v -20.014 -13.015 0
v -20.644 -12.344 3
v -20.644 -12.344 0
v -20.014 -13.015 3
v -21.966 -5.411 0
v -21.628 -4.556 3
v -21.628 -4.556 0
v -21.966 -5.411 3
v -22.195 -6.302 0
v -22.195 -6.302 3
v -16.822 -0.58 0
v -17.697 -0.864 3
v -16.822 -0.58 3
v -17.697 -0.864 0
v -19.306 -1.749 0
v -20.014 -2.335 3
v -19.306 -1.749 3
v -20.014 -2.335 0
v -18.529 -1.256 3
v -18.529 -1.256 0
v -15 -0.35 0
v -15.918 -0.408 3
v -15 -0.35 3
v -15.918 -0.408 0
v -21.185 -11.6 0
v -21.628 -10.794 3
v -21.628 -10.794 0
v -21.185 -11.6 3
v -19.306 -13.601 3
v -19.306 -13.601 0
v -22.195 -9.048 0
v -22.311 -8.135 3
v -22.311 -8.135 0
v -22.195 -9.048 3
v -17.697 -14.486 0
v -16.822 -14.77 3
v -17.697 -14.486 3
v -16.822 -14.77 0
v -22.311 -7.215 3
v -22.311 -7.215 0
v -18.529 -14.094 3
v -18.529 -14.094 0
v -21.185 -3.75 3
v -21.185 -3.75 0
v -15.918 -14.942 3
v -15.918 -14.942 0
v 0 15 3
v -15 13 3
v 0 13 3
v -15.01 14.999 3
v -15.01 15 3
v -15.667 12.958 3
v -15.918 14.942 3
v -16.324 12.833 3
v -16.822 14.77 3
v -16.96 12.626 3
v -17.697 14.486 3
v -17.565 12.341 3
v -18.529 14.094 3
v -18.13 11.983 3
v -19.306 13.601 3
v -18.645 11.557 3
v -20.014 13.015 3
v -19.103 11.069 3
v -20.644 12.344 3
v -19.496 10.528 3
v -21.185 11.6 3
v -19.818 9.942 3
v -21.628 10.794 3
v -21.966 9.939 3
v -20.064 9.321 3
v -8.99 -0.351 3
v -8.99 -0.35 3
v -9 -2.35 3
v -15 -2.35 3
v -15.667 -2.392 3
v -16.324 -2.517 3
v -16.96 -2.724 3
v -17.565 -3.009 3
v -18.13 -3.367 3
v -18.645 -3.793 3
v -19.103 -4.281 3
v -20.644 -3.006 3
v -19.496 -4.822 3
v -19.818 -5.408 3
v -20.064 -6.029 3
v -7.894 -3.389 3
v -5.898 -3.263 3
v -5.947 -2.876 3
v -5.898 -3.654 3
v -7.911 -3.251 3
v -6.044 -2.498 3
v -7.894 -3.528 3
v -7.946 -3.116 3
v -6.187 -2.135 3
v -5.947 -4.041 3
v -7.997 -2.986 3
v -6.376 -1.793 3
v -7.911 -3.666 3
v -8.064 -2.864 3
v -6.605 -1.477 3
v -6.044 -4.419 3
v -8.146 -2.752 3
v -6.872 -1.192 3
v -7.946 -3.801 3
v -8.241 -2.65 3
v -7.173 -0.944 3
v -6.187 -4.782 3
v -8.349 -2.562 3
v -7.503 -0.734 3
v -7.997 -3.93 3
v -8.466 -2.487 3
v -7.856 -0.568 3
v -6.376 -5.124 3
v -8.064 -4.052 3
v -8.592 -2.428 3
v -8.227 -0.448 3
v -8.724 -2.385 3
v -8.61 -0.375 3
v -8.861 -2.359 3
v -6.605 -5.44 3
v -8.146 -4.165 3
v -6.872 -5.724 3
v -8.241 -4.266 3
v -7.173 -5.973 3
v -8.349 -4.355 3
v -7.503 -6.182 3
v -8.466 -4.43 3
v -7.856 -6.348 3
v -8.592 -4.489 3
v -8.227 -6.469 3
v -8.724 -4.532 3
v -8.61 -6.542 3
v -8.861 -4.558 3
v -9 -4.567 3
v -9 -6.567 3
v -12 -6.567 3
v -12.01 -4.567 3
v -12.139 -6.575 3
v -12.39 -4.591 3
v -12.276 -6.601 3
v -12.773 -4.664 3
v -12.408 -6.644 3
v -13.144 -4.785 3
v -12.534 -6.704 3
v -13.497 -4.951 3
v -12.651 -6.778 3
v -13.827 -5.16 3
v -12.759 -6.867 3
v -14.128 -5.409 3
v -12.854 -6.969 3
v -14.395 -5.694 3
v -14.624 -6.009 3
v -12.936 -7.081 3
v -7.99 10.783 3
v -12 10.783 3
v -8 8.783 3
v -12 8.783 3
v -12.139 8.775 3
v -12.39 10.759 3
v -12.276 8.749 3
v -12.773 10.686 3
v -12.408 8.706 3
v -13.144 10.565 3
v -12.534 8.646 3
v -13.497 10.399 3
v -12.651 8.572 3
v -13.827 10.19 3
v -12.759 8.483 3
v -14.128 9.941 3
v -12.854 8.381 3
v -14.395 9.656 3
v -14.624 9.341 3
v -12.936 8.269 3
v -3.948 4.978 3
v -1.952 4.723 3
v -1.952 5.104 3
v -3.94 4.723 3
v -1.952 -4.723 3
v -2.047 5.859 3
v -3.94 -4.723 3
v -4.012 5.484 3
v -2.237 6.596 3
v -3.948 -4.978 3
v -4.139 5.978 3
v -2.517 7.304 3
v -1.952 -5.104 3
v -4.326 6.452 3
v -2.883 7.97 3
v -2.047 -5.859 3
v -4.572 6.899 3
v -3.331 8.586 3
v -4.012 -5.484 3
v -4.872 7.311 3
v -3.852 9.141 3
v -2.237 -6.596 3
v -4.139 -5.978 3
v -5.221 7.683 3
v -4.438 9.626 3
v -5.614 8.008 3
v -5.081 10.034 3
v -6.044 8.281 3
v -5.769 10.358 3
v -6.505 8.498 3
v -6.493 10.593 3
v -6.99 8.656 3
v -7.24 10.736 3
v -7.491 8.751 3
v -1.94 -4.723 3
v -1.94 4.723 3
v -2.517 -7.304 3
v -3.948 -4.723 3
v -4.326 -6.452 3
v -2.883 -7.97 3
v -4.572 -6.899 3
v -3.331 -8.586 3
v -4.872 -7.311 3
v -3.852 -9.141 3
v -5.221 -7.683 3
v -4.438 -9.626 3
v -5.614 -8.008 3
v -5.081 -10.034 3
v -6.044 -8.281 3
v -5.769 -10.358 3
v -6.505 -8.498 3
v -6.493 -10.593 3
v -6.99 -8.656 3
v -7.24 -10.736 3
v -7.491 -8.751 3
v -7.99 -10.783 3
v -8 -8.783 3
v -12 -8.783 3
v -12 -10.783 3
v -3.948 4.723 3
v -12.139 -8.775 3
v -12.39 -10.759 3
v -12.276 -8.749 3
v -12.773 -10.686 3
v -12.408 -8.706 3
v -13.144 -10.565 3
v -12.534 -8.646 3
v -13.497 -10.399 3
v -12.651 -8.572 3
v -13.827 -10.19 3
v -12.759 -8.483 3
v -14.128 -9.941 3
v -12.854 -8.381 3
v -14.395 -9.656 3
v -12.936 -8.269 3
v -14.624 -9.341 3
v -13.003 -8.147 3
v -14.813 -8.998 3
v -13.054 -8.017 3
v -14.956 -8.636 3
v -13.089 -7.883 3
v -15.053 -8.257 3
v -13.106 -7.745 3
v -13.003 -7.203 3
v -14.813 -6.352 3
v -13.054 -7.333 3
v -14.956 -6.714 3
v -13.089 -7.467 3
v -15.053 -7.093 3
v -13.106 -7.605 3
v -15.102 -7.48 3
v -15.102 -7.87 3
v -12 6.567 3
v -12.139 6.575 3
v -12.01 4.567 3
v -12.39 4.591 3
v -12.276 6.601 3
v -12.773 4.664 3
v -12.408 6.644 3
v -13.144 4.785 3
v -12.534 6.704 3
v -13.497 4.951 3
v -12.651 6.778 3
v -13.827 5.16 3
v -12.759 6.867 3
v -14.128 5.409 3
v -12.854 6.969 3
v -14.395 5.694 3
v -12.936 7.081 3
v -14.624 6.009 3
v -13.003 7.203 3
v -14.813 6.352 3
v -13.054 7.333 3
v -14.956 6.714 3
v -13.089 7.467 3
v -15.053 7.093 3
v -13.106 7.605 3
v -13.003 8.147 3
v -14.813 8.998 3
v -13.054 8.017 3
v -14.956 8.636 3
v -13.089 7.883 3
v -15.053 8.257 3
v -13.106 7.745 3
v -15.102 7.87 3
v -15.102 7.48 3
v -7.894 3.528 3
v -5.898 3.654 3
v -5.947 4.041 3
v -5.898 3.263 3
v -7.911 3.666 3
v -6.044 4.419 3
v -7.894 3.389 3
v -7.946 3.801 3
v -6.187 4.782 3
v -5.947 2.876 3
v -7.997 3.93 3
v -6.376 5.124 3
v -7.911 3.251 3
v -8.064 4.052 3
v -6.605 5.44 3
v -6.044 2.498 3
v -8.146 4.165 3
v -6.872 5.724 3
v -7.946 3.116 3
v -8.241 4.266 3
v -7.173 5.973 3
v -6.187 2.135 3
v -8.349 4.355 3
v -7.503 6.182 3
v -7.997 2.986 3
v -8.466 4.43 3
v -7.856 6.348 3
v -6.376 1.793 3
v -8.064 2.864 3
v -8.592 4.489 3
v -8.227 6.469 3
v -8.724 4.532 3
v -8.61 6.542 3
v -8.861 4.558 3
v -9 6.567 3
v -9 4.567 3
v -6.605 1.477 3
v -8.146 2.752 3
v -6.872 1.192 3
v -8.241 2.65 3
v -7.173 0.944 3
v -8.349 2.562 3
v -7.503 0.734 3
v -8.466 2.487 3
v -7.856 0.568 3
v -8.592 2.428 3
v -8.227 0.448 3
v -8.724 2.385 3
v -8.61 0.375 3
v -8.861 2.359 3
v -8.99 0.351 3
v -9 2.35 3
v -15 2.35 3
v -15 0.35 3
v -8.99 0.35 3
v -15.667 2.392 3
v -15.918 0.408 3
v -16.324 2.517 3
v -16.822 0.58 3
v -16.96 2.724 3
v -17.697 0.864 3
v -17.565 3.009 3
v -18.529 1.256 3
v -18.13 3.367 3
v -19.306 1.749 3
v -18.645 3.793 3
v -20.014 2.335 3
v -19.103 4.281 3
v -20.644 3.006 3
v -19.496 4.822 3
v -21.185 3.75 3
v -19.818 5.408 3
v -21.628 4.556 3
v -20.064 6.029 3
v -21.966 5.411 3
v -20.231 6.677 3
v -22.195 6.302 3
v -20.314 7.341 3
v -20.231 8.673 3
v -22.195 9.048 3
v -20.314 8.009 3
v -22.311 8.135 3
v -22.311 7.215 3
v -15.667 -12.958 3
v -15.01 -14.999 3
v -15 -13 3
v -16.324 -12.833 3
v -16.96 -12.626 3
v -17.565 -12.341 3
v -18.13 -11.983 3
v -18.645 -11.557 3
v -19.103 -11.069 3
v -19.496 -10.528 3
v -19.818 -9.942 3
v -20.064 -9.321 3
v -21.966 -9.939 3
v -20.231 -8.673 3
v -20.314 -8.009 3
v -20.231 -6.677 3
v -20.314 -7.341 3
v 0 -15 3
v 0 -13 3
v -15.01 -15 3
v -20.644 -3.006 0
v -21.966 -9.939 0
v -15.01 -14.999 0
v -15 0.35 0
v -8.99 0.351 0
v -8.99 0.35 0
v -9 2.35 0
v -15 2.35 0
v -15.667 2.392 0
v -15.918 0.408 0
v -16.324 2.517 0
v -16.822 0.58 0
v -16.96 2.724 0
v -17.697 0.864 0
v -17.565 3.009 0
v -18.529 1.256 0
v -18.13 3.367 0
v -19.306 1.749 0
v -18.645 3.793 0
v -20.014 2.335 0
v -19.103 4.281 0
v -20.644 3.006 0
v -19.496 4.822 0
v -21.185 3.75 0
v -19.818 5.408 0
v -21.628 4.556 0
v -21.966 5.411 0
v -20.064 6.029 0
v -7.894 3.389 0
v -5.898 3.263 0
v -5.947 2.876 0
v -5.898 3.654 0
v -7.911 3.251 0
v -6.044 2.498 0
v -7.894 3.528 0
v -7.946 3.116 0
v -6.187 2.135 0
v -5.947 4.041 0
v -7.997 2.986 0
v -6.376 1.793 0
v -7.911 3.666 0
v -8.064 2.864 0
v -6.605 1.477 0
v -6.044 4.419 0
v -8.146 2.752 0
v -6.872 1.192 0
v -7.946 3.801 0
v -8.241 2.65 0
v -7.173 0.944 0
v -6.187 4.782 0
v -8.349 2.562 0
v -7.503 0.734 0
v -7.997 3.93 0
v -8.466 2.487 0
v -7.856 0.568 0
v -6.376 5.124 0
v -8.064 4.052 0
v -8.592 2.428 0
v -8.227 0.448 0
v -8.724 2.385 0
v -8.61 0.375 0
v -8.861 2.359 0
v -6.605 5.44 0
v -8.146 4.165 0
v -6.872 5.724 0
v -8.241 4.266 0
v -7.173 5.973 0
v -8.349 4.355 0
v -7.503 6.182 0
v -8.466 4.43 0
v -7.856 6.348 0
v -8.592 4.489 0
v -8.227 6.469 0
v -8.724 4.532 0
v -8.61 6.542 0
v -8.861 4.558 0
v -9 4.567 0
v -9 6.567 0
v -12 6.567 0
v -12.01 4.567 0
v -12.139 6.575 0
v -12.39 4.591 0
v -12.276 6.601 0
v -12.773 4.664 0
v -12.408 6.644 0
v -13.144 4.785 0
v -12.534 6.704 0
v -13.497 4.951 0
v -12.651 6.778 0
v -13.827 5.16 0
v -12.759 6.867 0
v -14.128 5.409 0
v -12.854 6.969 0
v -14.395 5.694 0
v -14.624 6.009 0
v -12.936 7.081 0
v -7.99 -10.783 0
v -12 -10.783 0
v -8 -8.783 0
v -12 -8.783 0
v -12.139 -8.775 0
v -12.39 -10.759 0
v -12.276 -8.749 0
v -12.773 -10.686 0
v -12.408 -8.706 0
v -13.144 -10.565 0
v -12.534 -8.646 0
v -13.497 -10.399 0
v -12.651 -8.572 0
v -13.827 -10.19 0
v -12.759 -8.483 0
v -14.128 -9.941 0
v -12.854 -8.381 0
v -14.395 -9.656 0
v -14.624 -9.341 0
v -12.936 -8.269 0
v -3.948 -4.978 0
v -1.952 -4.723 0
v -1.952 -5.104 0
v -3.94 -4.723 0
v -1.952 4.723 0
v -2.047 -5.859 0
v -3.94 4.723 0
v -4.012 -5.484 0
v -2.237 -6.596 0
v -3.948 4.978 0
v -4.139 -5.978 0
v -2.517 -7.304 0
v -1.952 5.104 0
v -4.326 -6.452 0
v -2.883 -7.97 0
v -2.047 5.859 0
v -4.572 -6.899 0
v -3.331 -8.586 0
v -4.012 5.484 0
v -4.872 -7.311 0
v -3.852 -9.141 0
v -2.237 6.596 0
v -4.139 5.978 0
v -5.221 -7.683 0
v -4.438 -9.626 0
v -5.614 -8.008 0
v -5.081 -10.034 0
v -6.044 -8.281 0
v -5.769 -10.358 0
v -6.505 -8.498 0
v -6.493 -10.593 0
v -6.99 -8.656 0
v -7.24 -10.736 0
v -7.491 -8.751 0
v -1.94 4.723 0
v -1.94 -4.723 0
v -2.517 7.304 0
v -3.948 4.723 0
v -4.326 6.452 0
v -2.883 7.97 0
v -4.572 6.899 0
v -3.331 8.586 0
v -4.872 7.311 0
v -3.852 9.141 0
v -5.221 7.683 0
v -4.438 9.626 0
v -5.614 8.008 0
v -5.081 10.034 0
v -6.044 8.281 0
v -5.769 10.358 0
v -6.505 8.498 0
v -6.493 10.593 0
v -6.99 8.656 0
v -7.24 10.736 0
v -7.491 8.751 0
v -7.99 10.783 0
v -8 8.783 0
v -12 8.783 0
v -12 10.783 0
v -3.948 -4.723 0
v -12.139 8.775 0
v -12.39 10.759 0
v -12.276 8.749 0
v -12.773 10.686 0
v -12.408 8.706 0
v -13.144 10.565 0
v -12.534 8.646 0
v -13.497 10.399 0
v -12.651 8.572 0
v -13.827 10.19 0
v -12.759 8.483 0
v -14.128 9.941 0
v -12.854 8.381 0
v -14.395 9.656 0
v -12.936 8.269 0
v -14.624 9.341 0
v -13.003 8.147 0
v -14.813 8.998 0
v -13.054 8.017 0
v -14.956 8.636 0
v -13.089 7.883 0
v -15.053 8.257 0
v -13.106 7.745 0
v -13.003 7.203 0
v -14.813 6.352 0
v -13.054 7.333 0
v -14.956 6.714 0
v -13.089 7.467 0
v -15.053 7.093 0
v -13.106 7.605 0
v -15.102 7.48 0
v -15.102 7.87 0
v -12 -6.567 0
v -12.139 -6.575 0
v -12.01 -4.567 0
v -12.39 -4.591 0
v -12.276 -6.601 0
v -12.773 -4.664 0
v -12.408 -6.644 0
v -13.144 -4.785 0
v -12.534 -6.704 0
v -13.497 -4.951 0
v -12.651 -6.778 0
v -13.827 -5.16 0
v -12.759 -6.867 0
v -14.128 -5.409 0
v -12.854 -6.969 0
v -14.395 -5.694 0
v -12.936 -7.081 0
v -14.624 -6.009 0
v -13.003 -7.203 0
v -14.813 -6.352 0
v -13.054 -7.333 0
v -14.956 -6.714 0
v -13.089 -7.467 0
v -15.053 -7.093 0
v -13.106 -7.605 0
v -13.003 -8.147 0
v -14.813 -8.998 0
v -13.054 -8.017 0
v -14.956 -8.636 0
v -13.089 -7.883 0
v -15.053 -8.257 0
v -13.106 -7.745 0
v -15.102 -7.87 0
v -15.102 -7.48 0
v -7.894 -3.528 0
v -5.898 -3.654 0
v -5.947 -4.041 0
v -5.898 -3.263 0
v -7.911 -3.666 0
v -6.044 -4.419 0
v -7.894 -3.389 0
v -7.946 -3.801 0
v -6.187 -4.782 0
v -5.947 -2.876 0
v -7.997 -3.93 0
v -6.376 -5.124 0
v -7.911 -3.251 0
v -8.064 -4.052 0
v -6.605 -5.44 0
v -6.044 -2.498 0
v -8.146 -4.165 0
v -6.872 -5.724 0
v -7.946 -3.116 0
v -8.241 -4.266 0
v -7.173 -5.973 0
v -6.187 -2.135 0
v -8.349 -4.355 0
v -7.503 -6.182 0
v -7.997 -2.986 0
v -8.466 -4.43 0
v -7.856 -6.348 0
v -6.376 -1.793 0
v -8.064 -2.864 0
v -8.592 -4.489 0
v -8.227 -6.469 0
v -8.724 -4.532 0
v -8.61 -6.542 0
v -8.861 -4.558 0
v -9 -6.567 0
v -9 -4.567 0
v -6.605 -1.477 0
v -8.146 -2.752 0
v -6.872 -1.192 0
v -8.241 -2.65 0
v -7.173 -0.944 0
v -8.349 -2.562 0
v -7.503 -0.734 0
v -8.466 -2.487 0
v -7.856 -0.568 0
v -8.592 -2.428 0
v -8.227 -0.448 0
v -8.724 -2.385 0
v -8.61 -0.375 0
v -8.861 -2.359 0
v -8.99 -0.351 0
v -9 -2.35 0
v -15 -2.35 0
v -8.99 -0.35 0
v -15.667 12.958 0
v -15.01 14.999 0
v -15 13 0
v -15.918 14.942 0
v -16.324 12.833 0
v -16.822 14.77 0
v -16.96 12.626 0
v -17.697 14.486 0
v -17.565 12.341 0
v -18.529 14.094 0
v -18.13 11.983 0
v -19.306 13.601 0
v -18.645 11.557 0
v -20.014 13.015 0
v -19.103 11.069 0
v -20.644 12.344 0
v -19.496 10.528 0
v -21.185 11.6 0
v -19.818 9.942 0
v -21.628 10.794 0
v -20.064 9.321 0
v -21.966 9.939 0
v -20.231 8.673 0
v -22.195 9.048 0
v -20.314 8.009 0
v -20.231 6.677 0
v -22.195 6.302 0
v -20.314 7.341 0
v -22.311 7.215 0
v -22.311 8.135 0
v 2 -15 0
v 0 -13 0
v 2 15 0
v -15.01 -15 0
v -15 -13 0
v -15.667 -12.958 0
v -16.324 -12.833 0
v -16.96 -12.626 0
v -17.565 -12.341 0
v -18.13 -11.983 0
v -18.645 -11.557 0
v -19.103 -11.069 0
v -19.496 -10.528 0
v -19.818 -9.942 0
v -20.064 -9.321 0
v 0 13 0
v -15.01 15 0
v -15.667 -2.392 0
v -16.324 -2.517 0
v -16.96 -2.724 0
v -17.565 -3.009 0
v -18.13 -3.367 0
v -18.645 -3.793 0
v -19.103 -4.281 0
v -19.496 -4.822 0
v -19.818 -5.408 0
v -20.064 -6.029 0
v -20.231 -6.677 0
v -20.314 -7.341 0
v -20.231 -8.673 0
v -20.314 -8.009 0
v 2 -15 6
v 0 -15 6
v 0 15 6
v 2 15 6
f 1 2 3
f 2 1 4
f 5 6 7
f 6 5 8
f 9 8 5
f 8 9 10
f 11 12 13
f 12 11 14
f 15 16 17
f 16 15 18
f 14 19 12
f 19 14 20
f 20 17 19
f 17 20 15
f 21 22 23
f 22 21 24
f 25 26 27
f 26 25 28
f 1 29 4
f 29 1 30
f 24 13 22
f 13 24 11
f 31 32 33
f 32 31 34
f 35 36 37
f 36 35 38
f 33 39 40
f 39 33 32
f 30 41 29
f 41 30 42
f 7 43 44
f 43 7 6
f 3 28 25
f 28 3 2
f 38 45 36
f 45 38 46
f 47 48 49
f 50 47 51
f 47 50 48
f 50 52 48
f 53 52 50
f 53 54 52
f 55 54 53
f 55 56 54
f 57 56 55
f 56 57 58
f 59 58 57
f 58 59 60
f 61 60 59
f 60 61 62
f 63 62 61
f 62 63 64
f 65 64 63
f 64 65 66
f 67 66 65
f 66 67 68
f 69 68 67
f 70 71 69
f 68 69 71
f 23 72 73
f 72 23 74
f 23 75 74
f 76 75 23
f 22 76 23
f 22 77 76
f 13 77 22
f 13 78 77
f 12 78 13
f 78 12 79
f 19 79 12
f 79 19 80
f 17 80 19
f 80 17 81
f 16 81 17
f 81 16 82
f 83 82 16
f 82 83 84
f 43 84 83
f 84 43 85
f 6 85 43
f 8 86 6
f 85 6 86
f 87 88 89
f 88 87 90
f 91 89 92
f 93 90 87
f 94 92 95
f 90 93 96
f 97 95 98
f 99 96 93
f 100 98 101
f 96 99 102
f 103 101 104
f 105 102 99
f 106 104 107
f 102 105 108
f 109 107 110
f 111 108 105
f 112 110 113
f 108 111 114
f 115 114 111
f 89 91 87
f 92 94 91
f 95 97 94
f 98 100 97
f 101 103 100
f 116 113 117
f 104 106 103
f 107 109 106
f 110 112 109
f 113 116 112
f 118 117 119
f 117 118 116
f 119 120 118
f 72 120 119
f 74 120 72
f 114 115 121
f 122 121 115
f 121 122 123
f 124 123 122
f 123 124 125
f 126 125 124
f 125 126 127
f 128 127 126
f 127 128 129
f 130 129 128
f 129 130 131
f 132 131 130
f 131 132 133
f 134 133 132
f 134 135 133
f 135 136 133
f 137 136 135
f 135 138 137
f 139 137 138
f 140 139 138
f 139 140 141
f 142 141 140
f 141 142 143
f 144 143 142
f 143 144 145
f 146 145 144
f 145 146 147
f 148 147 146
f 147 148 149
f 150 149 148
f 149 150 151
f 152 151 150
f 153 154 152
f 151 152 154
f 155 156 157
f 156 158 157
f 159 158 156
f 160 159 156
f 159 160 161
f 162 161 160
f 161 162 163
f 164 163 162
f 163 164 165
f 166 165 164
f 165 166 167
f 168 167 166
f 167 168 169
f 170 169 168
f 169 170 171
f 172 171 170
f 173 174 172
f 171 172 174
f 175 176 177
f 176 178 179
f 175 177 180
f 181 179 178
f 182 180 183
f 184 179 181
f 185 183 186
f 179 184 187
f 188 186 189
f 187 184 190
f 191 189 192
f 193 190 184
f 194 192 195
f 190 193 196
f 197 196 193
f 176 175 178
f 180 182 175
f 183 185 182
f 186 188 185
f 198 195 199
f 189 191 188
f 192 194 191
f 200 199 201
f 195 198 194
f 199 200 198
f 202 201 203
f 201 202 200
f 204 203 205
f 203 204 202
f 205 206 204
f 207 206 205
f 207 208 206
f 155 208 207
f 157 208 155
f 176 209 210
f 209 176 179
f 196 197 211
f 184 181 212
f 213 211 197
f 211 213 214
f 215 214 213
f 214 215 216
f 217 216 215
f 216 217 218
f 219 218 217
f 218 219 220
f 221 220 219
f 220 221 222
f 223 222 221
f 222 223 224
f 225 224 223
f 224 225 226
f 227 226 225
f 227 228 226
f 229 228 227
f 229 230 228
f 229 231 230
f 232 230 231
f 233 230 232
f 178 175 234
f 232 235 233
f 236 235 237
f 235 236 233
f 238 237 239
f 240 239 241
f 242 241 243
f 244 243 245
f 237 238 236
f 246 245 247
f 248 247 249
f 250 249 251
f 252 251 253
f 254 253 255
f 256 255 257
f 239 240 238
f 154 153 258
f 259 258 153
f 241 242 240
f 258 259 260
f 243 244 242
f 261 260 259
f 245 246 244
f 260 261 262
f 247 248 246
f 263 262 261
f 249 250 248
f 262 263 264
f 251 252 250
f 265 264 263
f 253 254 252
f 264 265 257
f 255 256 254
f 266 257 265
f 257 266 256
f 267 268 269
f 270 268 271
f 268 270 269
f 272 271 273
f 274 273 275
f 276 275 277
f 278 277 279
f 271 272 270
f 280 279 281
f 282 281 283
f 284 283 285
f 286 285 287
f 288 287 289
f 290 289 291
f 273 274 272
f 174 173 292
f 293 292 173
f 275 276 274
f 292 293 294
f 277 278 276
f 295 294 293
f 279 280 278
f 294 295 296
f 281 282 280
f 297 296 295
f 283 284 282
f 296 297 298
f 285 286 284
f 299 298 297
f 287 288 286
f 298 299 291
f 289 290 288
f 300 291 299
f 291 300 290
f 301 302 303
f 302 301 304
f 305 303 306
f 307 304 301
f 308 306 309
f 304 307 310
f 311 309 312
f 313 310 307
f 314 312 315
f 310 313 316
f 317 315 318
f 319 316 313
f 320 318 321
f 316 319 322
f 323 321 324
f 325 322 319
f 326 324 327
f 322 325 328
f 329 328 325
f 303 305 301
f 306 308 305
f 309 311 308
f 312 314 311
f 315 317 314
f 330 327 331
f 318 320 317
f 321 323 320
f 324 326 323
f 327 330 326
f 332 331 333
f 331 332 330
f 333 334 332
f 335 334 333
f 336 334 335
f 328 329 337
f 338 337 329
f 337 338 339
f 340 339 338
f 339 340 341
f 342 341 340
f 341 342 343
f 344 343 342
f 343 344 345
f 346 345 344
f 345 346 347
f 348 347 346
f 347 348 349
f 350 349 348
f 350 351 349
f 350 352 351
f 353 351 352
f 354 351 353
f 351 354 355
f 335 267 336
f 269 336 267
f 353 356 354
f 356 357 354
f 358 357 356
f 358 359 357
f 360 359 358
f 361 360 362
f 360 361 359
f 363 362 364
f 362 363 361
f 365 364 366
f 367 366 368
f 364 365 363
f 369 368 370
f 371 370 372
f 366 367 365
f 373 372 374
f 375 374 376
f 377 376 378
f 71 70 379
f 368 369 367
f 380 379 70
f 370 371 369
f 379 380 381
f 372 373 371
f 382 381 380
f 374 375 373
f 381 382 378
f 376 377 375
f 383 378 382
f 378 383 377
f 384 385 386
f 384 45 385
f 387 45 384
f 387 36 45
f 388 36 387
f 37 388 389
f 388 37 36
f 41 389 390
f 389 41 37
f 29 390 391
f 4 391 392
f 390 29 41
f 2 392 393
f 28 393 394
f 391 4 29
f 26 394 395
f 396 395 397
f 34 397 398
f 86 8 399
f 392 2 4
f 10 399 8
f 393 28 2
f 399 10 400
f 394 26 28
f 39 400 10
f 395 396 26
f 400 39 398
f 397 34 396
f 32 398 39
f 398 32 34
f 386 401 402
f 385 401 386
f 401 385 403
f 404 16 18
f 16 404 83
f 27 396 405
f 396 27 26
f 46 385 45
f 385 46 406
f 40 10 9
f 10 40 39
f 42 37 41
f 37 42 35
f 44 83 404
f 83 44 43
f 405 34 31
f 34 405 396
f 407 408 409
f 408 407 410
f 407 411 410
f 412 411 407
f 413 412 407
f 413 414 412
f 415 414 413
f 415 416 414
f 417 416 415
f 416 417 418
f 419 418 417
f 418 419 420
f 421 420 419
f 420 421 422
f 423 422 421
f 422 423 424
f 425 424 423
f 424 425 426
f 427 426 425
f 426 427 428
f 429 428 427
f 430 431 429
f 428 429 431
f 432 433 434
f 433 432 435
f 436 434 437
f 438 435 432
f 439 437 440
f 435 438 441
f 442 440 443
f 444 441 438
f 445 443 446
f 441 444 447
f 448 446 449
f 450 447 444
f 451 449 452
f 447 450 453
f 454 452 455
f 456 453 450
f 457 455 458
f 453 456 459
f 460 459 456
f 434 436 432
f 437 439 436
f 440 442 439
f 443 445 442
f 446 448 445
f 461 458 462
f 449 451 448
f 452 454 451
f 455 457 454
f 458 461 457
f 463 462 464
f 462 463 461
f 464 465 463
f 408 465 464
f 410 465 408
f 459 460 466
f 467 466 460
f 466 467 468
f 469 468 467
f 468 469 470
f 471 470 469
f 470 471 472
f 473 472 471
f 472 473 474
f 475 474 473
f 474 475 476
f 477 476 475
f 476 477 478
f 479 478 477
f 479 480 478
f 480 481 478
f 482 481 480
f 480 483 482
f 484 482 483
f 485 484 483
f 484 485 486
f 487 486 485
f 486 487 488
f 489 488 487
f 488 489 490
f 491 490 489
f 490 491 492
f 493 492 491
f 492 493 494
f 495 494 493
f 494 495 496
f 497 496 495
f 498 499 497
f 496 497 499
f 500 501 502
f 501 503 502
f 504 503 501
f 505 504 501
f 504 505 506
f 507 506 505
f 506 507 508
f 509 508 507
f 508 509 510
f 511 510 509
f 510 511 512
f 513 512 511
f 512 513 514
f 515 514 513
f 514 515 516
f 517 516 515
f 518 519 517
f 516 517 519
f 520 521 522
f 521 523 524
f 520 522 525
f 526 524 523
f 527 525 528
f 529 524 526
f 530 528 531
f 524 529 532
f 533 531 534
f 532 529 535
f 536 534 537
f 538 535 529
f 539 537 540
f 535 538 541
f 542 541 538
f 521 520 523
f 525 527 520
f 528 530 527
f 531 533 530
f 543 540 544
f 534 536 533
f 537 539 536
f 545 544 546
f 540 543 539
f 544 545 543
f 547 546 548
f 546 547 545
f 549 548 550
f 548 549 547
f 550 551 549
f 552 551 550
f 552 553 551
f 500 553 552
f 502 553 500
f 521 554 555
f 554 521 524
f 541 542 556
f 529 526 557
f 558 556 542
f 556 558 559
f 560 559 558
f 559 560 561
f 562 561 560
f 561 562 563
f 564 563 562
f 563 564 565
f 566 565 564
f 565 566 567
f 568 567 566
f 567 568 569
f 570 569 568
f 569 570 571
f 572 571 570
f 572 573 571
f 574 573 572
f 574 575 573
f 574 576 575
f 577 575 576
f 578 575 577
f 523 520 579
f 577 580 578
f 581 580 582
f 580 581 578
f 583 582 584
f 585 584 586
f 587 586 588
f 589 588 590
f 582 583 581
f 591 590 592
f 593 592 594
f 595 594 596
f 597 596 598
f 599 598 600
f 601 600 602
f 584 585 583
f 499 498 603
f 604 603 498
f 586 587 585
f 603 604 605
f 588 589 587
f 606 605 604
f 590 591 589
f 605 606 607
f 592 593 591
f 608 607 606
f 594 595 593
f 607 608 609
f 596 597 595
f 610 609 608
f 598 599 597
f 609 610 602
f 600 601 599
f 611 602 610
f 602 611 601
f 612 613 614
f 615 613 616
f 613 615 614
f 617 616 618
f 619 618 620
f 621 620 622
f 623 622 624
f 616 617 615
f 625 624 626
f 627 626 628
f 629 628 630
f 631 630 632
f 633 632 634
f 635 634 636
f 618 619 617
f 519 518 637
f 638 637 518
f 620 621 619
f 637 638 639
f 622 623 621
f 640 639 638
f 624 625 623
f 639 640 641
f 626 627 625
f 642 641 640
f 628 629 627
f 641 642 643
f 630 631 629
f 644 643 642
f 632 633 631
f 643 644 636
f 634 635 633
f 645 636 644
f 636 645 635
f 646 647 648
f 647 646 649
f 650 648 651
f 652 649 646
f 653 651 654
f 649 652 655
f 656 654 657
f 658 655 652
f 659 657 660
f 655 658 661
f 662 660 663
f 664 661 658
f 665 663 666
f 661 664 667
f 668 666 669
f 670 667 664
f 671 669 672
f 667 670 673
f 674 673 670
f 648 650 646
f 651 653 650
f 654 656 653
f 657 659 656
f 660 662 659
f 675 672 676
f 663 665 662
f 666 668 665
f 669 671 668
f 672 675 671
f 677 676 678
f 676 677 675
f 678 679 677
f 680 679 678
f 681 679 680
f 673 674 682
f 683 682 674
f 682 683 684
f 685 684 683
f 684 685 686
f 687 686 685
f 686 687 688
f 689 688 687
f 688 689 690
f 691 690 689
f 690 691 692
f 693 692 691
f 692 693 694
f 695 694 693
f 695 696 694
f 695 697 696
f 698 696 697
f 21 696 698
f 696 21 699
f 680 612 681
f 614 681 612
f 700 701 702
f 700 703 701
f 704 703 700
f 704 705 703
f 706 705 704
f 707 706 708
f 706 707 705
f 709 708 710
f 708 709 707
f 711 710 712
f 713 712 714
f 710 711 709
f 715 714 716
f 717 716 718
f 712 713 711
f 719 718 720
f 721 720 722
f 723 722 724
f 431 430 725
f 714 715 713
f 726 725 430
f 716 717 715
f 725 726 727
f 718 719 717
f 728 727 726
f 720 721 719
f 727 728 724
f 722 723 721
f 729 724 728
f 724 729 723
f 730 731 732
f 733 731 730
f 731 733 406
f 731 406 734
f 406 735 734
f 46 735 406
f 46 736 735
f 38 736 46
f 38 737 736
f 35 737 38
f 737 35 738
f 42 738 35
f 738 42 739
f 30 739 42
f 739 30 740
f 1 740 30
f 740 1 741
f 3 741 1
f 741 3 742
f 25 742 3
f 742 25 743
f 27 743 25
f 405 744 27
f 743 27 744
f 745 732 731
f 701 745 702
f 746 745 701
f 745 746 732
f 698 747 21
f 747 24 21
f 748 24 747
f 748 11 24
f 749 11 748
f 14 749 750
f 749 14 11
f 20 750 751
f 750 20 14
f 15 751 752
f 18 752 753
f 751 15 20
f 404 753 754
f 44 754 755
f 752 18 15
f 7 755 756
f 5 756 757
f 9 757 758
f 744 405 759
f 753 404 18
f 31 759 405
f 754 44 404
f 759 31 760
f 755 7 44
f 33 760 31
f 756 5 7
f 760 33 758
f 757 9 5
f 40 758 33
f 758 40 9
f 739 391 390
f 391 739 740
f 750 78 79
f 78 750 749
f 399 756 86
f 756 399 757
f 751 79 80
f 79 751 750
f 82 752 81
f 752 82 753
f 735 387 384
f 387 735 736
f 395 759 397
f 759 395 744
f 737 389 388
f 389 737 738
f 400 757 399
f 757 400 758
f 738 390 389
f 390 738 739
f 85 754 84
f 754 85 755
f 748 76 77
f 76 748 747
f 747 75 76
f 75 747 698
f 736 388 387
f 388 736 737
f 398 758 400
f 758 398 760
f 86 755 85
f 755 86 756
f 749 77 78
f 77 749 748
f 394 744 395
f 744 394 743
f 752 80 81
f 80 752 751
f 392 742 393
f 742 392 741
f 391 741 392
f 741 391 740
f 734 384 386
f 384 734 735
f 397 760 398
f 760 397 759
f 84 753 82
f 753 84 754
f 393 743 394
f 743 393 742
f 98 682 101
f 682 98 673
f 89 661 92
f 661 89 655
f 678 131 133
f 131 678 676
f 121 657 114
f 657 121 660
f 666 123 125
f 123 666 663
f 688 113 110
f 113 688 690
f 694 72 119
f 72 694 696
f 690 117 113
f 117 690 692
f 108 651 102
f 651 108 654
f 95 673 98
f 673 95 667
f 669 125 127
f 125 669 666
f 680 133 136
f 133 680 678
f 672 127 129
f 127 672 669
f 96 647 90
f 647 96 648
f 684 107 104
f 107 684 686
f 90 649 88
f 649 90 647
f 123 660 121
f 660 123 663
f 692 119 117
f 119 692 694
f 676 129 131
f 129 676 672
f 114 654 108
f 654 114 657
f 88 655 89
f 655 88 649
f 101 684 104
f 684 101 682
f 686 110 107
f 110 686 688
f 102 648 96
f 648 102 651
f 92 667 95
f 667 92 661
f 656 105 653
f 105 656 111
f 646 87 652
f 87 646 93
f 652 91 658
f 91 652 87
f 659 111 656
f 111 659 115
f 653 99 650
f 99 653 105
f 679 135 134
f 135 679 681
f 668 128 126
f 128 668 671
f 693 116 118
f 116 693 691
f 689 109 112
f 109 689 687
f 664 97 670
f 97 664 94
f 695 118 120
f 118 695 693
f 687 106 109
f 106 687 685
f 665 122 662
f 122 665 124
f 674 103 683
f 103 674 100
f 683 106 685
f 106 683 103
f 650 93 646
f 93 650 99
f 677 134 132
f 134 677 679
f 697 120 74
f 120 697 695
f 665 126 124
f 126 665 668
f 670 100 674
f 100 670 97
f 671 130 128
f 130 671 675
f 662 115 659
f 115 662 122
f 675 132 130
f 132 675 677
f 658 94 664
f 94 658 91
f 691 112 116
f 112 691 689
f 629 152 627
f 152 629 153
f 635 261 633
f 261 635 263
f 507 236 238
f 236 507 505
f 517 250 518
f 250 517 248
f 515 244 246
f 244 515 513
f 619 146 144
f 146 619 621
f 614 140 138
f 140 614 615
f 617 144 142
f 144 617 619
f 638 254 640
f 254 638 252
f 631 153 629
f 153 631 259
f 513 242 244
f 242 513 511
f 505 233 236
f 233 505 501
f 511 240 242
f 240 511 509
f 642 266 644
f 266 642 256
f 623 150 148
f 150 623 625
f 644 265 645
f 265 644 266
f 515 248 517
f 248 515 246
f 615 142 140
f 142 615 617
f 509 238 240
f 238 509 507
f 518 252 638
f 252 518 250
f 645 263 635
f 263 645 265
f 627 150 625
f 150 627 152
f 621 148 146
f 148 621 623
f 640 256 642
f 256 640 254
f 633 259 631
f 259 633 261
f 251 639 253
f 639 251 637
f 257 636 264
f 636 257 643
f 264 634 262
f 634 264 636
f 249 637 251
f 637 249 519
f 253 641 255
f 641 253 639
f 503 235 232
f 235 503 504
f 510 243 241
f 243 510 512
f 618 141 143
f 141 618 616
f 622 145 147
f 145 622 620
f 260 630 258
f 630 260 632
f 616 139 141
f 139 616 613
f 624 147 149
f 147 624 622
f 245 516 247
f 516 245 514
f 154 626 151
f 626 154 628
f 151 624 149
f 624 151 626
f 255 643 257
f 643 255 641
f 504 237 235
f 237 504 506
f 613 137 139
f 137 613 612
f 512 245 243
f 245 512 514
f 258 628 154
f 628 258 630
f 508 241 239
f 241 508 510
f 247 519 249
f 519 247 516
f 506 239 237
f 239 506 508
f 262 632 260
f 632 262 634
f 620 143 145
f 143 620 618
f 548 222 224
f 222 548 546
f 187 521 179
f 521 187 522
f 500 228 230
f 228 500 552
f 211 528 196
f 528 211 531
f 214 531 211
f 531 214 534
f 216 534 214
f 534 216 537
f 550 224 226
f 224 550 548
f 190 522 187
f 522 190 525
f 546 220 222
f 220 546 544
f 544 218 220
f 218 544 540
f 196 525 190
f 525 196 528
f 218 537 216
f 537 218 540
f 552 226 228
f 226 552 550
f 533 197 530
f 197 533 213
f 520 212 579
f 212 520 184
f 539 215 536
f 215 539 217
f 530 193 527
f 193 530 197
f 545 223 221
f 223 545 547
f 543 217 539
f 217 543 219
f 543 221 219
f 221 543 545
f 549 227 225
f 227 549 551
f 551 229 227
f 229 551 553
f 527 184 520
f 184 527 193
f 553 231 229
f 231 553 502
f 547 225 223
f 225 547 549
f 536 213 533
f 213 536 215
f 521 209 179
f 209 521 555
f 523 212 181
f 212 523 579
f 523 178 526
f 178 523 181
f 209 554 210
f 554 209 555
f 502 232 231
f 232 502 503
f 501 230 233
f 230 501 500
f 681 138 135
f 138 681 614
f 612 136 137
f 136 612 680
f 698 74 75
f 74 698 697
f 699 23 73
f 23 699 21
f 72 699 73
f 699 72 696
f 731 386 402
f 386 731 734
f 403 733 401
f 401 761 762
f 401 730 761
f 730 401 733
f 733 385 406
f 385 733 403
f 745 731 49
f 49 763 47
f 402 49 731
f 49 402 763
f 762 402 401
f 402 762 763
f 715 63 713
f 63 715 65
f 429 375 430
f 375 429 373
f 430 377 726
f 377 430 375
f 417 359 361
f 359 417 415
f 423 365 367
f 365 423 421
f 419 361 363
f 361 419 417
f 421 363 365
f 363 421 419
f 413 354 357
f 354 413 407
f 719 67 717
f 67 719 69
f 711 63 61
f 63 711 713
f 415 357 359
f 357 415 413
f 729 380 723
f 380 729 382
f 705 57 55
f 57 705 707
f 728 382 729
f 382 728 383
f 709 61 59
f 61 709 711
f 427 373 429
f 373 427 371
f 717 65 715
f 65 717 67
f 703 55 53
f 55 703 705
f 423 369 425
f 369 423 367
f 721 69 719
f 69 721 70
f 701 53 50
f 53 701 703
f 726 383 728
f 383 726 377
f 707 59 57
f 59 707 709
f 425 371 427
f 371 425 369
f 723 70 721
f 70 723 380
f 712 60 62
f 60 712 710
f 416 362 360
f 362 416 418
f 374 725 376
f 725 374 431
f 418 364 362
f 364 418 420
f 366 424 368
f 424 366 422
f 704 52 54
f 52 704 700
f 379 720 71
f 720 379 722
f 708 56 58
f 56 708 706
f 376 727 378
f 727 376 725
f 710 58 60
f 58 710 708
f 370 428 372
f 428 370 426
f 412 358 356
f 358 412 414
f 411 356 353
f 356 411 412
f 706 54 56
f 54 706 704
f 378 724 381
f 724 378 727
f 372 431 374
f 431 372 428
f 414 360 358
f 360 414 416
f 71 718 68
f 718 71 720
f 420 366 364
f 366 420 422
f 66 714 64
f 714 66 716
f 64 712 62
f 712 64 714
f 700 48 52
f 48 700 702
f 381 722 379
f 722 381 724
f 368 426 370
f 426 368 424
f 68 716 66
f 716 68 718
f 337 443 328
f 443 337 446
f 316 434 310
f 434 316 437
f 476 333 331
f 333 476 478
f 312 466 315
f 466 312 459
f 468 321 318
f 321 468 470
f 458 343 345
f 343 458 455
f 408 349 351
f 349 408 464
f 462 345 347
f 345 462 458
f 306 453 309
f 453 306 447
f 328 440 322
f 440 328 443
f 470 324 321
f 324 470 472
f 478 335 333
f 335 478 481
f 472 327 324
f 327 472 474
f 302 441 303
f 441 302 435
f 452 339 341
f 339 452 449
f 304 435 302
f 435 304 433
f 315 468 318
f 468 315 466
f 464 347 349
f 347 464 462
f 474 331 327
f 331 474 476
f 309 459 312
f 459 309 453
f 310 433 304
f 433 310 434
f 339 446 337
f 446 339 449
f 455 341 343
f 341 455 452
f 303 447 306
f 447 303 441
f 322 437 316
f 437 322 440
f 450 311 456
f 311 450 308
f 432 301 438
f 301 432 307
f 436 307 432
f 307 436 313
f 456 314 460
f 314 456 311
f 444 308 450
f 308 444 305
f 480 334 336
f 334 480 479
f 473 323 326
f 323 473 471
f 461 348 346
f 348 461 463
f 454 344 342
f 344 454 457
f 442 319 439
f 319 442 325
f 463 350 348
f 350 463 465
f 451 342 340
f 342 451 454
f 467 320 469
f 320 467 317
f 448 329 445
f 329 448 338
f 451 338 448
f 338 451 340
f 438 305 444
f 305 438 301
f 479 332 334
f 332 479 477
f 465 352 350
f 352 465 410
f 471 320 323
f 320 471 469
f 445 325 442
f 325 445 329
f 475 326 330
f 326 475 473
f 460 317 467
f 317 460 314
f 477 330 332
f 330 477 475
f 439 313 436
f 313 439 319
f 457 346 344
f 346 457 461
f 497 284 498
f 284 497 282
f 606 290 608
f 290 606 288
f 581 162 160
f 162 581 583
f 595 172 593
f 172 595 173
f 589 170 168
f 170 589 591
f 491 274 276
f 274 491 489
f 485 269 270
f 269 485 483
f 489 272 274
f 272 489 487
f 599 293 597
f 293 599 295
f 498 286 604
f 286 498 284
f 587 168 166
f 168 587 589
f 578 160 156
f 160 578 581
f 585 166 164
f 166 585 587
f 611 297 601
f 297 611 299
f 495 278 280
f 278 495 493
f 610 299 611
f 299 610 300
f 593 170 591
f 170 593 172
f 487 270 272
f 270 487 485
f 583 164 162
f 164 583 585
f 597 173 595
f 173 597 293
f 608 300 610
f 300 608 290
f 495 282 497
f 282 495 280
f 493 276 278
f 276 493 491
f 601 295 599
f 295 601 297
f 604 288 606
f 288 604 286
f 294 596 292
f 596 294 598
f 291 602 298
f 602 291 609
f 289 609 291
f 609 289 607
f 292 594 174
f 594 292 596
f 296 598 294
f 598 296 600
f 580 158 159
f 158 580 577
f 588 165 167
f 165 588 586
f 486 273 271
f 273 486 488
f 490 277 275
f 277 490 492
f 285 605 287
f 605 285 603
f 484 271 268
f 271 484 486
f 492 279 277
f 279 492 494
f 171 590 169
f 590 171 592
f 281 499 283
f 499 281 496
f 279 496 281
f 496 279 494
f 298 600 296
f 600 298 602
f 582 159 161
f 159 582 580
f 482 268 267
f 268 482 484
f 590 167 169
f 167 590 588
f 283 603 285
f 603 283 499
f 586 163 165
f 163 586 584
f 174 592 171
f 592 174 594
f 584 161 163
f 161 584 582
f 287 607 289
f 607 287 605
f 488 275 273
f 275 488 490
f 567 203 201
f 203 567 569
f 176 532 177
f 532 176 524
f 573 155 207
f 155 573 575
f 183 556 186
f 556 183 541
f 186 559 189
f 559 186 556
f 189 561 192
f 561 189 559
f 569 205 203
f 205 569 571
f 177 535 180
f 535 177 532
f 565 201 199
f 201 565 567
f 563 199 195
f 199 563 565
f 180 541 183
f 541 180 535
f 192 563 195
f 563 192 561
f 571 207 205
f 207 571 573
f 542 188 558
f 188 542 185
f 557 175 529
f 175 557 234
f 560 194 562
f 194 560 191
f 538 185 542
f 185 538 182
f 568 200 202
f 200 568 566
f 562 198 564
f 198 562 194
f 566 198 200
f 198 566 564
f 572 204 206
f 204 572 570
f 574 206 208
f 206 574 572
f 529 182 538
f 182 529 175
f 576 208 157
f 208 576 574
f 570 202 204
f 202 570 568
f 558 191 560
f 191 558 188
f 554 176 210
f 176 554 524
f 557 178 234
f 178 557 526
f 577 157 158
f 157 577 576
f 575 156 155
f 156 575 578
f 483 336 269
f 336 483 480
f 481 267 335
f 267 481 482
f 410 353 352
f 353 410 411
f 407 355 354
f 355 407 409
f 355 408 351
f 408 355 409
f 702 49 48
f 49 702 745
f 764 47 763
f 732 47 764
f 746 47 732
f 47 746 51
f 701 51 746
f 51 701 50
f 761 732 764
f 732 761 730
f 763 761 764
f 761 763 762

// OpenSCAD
// draw an arc width height h between radius r1..r2 and angles a1..a2
module arc(r1, r2, h, a1=0, a2=0) {
  if(a2-a1<=180) {
    difference() {
      cylinder(r=r2,h=h);
      translate([0,0,-1]) {
        cylinder(r=r1,h=h+2);
      }
      rotate(a2) {
        translate([-r1-r2,0,-1]) {
          cube([2*(r1+r2),2*(r1+r2),h+2]);
        }
      }
      rotate(a1+180) {
        translate([-r1-r2,0,-1]) {
          cube([2*(r1+r2),2*(r1+r2),h+2]);
        }
      }
    }
  } else {
    difference() {
      cylinder(r=r2,h=h);
      translate([0,0,-1]) {
        cylinder(r=r1,h=h+2);
      }
      intersection() {
	      rotate(a2) {
          translate([-r1-r2,0,-1]) {
            cube([2*(r1+r2),2*(r1+r2),h+2]);
          }
        }
	      rotate(a1+180) {
          translate([-r1-r2,0,-1]) {
            cube([2*(r1+r2),2*(r1+r2),h+2]);
          }
        }
	    }
    }
  }
}

                           
// sline - generate a "snake line" of width w and height h 
// with a arbitrary sequence of segments defined by a radius and a turning angle
//
//   angle[i] > 0  left turn / counter-clockwise
//   angle[i] < 0  left turn / clockwise
//   angle[i] = 0  straight segment with length radius[i]
//
                           
// Heinz Spiess, 2014-09-06 (CC BY-SA)
                           
module sline(angle,radius,i,w,h){
  r = abs(radius[i]);
  a = angle[i];
  scale([angle[i]>=0?1:-1,1,1])
  translate([a?r:0,0,0]) {
    translate([-w/2,-r-0.01,0]) cube([w,0.02,h]); // tiny overlap!
    if(a) {
      arc(r-w/2,r+w/2,0,a,h=h);
    } else if(r>0) {
      translate([-w/2,-r,0]) {
        cube([w,r,h]);
      }
    }
    if(i+1<len(angle)) {
      rotate(angle[i]) {
	      translate([a?-r:0,a?0:-r,0]) {
	       sline(angle,radius,i+1,w,h);
        }
      }
    }
  }
}

$fn = 50;

module plastic_spring(
  h = 20, // height
  d=18, // ?
  w = 6,  // case wall thickness
  ws = 2, // spring wall thickness
  el = 6, // ?
  l = 14, // len
  ){


  r = l + 2*ws;
  D = d + 2 * w - 2 * ws - 0.7;
      
  // plastic spring
  for(sy=[-1,1]) {
    scale([1,sy,1]) {
      translate([0,d/2+w-ws/2,0]) {
        rotate(-90) {
          sline([0,180,0,180,0,-180,0,90,0],[r,D/4,el,D/12,el/2,
            D/12,1+el/2,D/5,D/3],0,ws, h);
        }
      }
    }
  }
}

plastic_spring(l=11, h=3);
translate([0, -15, 0]) {
  cube([2, 30, 6]);
}
